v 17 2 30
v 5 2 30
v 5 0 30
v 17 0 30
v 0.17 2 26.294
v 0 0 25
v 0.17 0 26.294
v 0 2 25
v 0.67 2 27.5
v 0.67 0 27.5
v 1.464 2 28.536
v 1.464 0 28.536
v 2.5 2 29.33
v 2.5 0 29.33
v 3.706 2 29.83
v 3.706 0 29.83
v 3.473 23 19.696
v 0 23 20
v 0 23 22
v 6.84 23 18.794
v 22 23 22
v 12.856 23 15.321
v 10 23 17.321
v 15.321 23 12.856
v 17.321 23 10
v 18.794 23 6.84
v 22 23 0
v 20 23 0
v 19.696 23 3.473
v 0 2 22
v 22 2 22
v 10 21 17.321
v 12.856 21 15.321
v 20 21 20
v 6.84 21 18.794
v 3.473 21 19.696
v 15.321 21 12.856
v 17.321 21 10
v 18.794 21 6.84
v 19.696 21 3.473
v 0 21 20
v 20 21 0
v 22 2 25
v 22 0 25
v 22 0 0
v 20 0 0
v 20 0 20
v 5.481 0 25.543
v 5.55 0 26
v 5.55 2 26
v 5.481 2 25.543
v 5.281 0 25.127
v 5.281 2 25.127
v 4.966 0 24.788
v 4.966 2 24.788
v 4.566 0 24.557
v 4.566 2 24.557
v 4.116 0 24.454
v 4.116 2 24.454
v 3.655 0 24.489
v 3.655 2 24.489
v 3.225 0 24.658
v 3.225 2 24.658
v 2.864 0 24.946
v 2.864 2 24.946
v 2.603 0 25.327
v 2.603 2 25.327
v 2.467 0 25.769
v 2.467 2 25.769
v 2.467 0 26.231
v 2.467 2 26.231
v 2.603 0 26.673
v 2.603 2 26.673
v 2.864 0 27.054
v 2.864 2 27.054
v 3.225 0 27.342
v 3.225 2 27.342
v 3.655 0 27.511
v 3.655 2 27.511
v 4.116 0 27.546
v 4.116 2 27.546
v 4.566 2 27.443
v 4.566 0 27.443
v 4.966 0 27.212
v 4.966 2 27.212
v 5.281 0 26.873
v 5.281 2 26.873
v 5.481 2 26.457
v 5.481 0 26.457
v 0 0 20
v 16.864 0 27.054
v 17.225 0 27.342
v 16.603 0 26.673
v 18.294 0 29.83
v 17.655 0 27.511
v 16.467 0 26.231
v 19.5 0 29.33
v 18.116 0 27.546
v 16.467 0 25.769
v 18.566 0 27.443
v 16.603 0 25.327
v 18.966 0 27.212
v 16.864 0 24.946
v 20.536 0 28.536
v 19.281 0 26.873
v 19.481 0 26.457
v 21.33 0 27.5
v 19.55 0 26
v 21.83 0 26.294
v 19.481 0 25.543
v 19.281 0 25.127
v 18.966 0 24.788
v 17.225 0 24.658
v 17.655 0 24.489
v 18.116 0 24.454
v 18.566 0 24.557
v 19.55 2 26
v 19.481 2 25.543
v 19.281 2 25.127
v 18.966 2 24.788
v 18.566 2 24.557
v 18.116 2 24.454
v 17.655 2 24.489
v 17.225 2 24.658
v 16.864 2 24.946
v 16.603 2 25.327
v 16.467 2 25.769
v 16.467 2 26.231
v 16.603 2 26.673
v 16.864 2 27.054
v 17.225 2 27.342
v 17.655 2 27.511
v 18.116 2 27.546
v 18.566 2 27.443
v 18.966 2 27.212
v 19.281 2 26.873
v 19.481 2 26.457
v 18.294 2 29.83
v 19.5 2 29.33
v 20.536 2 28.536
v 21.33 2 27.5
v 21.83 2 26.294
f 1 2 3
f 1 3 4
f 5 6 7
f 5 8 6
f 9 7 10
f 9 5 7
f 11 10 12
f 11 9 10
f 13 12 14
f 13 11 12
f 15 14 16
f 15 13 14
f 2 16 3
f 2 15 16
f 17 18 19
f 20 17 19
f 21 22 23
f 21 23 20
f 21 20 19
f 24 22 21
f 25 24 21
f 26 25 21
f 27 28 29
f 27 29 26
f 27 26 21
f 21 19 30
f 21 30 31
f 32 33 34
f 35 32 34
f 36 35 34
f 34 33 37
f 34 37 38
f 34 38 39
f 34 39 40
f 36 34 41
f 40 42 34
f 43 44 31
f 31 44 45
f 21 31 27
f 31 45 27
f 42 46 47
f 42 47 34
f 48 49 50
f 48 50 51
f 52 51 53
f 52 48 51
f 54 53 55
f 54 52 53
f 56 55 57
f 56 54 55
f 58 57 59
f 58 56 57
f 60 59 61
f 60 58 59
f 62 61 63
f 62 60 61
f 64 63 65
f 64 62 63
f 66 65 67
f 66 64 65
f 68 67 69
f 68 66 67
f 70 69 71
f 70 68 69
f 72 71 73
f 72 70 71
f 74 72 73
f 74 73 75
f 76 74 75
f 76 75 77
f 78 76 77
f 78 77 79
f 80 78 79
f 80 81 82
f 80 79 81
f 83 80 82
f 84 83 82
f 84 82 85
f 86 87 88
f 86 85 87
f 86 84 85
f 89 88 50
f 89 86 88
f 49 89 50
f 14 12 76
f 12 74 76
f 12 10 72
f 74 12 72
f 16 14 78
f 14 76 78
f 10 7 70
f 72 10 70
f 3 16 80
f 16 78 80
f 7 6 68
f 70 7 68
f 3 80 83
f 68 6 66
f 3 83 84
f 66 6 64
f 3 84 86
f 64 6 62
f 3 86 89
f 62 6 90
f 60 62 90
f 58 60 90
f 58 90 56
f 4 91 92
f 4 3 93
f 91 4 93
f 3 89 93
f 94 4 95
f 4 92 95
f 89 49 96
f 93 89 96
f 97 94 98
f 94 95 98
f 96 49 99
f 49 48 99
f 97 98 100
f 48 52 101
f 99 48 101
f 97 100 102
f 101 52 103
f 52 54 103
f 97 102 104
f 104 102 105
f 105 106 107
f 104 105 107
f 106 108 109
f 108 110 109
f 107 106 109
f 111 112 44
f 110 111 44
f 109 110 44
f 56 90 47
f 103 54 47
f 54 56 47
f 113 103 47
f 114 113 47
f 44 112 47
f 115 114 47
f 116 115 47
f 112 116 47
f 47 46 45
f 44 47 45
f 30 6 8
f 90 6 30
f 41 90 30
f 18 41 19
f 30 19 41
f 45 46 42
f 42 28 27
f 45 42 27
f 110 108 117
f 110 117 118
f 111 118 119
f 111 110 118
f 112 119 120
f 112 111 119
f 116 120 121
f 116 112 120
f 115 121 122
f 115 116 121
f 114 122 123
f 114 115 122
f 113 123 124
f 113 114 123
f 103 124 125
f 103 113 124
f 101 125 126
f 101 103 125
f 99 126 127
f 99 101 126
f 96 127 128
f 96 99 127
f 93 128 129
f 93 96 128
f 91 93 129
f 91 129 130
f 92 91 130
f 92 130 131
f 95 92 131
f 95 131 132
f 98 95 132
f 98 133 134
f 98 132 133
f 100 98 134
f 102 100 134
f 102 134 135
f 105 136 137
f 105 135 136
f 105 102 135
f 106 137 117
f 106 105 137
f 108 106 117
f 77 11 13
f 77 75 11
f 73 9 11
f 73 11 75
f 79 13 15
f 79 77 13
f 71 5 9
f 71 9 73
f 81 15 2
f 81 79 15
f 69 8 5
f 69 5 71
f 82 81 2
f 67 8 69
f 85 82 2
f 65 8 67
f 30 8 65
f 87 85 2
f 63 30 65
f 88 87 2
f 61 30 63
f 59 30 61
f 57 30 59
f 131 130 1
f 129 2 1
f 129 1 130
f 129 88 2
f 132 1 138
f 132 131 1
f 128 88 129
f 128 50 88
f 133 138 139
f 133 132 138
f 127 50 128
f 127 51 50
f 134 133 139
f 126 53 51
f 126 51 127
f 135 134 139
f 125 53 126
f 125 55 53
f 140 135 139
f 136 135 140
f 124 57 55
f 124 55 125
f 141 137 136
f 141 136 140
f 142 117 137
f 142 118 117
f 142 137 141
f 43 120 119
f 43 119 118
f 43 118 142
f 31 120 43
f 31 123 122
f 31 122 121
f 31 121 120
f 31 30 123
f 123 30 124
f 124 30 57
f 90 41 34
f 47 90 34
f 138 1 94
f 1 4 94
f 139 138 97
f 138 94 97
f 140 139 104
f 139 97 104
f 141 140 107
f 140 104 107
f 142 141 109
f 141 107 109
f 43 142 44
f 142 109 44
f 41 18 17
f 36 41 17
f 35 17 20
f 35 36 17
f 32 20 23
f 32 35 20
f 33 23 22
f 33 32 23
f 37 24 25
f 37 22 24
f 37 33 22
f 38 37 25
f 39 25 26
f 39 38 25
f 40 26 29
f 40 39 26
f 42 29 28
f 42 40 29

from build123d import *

# Parameters (mm, degrees)
CYLINDER001_R          = 20
CYLINDER001_DEPTH      = 25
CYLINDER001_ROLL_ANGLE = -90
CYLINDER002_R          = 1.55
CYLINDER002_DEPTH      = 10
CYLINDER002_ROLL_ANGLE = -90
CYLINDER_R             = 1.55
CYLINDER_DEPTH         = 10
CYLINDER_ROLL_ANGLE    = -90
BOX003_W               = 10
BOX003_H               = 6
BOX003_DEPTH           = 31
BOX001_W               = 20
BOX001_H               = 21
BOX001_DEPTH           = 20
BOX_W                  = 22
BOX_H                  = 23
BOX_DEPTH              = 22
BOX002_W               = 30
BOX002_H               = 2
BOX002_DEPTH           = 30
FILLET_R               = 5
FILLET001_R            = 5


with BuildPart() as cilindro001:
    # Cylinder001 → Cylinder001 (new body)
    with BuildSketch(Plane.XY):
        Circle(CYLINDER001_R)
    extrude(amount=CYLINDER001_DEPTH)


with BuildPart() as cilindro001_1:
    # Cylinder001 roll: moved
    add(cilindro001.part.rotate(Axis((0, 0, 0), (1, 0, 0)), CYLINDER001_ROLL_ANGLE))


with BuildPart() as cilindro001_2:
    # Cylinder001 placement: moved
    add(cilindro001_1.part)


with BuildPart() as cilindro002:
    # Cylinder002 → Cylinder002 (new body)
    with BuildSketch(Plane.XY):
        Circle(CYLINDER002_R)
    extrude(amount=CYLINDER002_DEPTH)


with BuildPart() as cilindro002_1:
    # Cylinder002 roll: moved
    add(cilindro002.part.rotate(Axis((0, 0, 0), (1, 0, 0)), CYLINDER002_ROLL_ANGLE))


with BuildPart() as cilindro002_2:
    # Cylinder002 placement: moved
    add(cilindro002_1.part.moved(Location((4, -2, 26))))


with BuildPart() as cilindro:
    # Cylinder → Cylinder (new body)
    with BuildSketch(Plane.XY):
        Circle(CYLINDER_R)
    extrude(amount=CYLINDER_DEPTH)


with BuildPart() as cilindro_1:
    # Cylinder roll: moved
    add(cilindro.part.rotate(Axis((0, 0, 0), (1, 0, 0)), CYLINDER_ROLL_ANGLE))


with BuildPart() as cilindro_2:
    # Cylinder placement: moved
    add(cilindro_1.part.moved(Location((18, -2, 26))))


with BuildPart() as cubo003:
    # Box003 → Box003 (new body)
    with BuildSketch(Plane(origin=(22, 0, 0), x_dir=(1, 0, 0), z_dir=(0, 0, 1))):
        with Locations((5, 3)):
            Rectangle(BOX003_W, BOX003_H)
    extrude(amount=BOX003_DEPTH)


with BuildPart() as cubo001:
    # Box001 → Box001 (new body)
    with BuildSketch(Plane.XY):
        with Locations((10, 10.5)):
            Rectangle(BOX001_W, BOX001_H)
    extrude(amount=BOX001_DEPTH)


with BuildPart() as cubo:
    # Box → Box (new body)
    with BuildSketch(Plane.XY):
        with Locations((11, 11.5)):
            Rectangle(BOX_W, BOX_H)
    extrude(amount=BOX_DEPTH)


with BuildPart() as fillet001:
    # Box002 → Box002 (new body)
    with BuildSketch(Plane.XY):
        with Locations((15, 1)):
            Rectangle(BOX002_W, BOX002_H)
    extrude(amount=BOX002_DEPTH)

    # Fusion: union Cubo
    add(cubo.part)

    # Cut: cut Cubo001
    add(cubo001.part, mode=Mode.SUBTRACT)

    # Cut001: cut Cubo003
    add(cubo003.part, mode=Mode.SUBTRACT)

    # Cut002: cut Cilindro
    add(cilindro_2.part, mode=Mode.SUBTRACT)

    # Cut003: cut Cilindro002
    add(cilindro002_2.part, mode=Mode.SUBTRACT)

    # Cut004: cut Cilindro001
    add(cilindro001_2.part, mode=Mode.SUBTRACT)

    # Fillet
    fillet_edges = [fillet001.edges().sort_by_distance(p)[0] for p in [
        (0, 1, 30),
    ]]
    fillet(fillet_edges, radius=FILLET_R)

    # Fillet001
    fillet001_edges = [fillet001.edges().sort_by_distance(p)[0] for p in [
        (22, 1, 30),
    ]]
    fillet(fillet001_edges, radius=FILLET001_R)


solid = fillet001.part
